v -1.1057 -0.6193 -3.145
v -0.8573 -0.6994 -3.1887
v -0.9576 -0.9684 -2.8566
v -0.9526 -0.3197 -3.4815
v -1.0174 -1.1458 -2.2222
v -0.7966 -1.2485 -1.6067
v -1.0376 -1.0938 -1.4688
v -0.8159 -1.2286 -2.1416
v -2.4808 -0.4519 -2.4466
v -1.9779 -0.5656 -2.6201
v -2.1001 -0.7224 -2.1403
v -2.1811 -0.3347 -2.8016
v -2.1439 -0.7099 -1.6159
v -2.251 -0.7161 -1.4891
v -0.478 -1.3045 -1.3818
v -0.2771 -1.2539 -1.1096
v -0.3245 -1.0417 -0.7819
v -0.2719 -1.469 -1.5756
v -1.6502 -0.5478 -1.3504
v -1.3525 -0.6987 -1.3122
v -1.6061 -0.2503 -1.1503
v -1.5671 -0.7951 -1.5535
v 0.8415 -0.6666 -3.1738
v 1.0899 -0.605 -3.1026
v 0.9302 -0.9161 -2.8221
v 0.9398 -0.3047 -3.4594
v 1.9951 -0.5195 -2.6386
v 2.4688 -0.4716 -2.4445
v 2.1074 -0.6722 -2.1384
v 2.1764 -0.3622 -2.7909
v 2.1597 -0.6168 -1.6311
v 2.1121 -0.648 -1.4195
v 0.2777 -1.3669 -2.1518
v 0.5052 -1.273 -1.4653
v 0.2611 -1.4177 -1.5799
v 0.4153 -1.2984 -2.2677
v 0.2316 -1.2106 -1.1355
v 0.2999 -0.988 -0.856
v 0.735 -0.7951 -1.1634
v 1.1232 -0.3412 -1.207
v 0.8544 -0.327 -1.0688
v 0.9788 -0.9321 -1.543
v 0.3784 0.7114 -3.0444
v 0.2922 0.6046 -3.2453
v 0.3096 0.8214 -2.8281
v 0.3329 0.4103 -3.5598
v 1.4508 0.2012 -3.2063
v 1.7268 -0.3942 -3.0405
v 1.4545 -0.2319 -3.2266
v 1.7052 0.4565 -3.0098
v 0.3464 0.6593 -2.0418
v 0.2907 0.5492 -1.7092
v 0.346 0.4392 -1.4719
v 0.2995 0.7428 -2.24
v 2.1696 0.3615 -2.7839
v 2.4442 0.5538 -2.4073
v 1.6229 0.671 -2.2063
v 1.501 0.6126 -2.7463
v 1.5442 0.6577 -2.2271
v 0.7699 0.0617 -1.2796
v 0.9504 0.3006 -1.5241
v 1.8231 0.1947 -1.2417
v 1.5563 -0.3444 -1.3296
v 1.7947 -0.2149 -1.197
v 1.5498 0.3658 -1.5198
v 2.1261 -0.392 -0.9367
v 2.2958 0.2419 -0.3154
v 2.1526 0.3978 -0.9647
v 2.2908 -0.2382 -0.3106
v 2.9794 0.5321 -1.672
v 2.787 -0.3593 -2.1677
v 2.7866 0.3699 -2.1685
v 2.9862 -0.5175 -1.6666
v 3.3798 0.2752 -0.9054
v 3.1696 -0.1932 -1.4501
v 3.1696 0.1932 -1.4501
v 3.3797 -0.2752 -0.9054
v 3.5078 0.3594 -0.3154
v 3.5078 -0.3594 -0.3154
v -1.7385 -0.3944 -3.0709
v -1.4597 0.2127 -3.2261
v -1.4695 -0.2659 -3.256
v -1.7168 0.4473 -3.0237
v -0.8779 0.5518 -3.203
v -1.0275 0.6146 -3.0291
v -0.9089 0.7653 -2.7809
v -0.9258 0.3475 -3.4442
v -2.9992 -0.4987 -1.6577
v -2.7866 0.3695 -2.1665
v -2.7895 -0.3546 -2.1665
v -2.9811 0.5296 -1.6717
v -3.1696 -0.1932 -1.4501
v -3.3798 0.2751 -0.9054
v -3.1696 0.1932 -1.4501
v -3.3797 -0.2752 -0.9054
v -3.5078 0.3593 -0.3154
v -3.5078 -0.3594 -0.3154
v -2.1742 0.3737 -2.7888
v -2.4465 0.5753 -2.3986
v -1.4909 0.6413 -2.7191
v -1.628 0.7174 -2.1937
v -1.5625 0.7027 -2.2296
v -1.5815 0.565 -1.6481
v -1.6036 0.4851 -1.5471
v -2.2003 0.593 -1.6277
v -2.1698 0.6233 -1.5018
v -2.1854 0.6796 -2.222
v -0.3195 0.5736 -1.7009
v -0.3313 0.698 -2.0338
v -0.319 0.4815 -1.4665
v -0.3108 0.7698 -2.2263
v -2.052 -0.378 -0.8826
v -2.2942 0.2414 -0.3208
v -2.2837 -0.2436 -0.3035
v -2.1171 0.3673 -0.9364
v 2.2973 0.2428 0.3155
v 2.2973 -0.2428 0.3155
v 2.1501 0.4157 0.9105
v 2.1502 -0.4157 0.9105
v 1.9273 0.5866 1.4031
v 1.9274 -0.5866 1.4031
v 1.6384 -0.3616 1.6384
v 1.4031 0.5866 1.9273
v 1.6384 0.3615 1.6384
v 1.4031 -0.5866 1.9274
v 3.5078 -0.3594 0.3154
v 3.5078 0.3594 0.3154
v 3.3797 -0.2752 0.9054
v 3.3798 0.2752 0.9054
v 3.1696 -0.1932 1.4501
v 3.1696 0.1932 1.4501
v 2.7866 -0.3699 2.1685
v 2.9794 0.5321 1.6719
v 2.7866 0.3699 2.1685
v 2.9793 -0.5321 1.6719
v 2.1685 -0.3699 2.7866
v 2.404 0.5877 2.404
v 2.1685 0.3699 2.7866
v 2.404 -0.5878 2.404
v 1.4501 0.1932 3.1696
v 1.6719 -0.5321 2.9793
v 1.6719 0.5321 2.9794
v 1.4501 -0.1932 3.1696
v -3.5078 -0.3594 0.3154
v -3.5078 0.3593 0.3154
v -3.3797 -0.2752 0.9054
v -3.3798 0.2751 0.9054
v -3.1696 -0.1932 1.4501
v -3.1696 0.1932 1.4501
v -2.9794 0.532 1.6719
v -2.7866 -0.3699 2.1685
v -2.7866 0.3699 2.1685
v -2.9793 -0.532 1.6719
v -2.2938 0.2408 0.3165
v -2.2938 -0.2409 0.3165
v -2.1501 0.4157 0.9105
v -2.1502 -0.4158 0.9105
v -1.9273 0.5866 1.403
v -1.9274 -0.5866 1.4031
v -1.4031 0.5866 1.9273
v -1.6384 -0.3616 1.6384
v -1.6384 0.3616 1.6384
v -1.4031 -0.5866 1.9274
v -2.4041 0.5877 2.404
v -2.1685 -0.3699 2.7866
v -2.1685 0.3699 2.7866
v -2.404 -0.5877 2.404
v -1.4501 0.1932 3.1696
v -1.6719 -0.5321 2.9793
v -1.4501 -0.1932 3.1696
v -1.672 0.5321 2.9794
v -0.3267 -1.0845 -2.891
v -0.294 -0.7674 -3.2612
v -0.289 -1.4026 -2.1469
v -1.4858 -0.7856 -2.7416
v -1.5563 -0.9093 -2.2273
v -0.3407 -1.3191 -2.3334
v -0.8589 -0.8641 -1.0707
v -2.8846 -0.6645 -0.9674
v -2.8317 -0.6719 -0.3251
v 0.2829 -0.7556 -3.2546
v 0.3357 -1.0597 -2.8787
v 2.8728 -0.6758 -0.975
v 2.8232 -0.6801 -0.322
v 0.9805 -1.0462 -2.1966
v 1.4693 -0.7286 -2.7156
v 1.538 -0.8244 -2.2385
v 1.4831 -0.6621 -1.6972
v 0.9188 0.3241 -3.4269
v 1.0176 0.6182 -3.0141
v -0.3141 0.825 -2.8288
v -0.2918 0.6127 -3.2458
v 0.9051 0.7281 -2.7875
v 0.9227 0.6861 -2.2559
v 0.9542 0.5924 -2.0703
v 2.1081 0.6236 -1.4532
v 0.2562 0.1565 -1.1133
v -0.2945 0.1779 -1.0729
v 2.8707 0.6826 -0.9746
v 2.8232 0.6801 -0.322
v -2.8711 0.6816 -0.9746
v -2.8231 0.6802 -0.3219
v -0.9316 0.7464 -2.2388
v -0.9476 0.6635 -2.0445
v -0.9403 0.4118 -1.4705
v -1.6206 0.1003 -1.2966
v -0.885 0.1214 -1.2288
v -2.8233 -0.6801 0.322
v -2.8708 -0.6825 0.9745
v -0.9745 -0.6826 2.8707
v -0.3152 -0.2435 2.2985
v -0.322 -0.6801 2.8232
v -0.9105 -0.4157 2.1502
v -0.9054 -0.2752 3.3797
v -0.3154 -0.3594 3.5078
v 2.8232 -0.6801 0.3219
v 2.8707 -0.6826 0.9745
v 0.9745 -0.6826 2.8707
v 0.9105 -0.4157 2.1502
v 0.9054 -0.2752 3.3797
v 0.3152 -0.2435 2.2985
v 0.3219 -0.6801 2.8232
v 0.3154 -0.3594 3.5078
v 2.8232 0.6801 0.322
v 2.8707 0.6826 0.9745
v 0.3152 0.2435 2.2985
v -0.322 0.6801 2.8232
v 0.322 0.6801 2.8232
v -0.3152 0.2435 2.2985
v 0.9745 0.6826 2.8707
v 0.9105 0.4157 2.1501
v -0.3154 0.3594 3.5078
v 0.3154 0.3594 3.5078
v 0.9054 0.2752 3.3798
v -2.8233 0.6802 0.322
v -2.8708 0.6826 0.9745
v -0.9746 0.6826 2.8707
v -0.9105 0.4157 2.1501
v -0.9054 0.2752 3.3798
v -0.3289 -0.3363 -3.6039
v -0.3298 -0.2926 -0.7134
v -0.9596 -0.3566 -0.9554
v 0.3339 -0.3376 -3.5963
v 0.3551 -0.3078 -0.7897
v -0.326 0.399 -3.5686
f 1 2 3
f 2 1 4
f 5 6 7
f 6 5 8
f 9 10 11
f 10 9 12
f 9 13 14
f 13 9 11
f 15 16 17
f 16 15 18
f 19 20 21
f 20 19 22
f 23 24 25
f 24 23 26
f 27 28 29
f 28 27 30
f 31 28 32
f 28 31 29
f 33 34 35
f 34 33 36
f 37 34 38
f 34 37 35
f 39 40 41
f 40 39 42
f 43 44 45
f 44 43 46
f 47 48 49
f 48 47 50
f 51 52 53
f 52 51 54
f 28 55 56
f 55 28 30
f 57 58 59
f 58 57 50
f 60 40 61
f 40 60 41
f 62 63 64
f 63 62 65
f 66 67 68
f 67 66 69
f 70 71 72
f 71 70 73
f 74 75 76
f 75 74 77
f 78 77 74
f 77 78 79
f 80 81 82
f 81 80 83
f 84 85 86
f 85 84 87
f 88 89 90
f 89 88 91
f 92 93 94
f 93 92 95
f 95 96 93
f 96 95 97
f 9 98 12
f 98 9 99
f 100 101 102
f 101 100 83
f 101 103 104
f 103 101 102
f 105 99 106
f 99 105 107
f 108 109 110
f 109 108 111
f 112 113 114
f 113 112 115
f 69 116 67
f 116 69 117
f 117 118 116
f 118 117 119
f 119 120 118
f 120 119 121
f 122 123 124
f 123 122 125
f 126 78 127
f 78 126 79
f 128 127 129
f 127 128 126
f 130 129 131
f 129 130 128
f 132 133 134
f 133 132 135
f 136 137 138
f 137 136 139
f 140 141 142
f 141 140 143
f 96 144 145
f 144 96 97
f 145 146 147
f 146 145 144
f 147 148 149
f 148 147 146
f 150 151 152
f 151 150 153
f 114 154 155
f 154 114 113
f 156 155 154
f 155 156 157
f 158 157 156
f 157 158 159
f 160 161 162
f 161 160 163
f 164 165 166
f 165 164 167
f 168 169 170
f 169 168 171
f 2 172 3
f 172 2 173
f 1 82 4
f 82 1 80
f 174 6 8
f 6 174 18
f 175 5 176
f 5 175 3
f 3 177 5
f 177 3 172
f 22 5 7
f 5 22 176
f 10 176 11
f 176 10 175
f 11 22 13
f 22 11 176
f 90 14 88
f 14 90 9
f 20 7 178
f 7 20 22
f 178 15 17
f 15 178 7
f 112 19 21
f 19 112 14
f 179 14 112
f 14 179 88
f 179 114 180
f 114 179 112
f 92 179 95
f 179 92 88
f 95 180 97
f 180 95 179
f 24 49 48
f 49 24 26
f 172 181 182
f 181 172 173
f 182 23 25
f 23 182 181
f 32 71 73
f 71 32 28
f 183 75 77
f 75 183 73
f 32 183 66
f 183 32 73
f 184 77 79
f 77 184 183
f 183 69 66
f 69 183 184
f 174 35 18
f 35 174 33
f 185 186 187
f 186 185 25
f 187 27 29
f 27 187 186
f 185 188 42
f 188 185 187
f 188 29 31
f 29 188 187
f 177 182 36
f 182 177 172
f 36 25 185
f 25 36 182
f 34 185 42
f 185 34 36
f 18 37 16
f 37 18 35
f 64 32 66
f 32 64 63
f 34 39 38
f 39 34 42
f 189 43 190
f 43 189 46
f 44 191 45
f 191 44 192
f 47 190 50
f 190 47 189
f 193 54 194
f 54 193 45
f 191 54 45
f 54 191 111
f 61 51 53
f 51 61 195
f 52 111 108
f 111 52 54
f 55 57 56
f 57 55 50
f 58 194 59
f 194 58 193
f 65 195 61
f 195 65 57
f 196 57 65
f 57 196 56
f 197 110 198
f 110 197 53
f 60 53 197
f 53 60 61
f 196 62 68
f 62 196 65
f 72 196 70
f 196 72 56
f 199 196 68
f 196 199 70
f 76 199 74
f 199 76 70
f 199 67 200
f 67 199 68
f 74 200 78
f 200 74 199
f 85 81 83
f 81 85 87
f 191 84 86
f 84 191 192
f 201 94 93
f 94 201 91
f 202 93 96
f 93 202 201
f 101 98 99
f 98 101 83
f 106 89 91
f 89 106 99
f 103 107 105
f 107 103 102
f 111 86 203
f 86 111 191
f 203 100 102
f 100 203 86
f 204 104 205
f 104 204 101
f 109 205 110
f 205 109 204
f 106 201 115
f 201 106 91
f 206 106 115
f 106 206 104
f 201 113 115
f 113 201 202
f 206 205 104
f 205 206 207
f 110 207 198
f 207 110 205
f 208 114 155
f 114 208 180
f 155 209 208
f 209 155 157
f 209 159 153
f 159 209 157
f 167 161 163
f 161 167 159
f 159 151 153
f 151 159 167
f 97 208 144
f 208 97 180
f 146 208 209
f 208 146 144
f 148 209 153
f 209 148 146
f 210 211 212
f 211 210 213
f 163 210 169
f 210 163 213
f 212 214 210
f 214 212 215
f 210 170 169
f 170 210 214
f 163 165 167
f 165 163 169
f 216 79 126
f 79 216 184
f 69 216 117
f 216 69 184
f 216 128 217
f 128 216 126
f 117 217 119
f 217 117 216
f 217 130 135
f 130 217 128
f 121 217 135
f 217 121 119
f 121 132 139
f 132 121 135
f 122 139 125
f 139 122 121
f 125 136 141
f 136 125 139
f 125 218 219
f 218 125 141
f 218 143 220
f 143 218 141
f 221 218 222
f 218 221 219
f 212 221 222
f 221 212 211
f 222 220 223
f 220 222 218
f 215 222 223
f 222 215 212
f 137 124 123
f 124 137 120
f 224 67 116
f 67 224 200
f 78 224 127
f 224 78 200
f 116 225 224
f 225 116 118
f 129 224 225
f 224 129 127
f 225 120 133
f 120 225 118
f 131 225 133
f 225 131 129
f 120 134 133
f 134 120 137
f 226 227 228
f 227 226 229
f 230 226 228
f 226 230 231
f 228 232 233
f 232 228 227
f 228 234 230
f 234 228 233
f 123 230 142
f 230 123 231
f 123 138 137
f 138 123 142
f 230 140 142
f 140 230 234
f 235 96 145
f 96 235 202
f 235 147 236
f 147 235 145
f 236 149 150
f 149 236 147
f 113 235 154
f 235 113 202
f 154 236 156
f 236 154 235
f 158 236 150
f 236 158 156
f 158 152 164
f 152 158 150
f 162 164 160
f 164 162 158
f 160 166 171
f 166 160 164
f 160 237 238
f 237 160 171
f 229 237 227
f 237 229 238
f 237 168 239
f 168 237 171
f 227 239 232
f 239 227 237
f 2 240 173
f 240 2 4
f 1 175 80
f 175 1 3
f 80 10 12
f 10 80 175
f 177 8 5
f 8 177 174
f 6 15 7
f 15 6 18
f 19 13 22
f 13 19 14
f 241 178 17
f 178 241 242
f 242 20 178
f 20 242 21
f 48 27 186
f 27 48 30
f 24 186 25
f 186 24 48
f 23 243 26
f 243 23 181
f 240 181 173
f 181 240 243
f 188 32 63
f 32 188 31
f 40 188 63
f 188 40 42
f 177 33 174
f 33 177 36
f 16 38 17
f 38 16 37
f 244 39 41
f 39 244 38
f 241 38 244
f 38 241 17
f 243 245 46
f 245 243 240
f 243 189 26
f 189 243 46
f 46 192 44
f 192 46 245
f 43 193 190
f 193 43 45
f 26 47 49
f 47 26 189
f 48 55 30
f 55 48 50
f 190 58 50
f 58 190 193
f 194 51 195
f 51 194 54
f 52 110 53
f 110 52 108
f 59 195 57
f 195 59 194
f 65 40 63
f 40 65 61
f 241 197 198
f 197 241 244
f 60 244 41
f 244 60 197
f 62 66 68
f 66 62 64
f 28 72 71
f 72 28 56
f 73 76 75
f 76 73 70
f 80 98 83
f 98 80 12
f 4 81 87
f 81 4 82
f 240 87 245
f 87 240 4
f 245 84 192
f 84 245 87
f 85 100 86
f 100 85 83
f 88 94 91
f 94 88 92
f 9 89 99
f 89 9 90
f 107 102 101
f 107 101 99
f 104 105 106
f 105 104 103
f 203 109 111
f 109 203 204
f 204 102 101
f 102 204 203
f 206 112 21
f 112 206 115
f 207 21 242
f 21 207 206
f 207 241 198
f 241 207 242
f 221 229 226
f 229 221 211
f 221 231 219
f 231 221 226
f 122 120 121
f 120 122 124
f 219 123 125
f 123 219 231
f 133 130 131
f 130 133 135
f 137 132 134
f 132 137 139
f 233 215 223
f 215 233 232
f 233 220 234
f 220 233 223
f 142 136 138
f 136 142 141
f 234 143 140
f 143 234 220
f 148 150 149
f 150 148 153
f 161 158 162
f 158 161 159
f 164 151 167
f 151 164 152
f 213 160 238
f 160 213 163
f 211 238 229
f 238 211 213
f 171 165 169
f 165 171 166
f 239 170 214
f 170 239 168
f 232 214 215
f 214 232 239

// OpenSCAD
model=[];
DualC(model);
//////////////////////////////////////////////////////////////////////////////////////
module DualC(model){
v=octree([-10,-10,-10], 20 ,model,5);
points=[for(i=[0:len(v)-1])if(v[i][1] !=undef) v[i][1]];
faces=faceworker(v);
echo(len(v),len(points),len(faces));
polyhedron(points,faces);
echo(points,faces);}
 
//////////////////////////////////////////////////////////////////////////////////////
//////////////////////////////////////////////////////////////////////////////////////

function octree(p1,S,model,d=6)=let(s=S/2,e1=eval(p1))d>0?
 abs(e1) >S*1.71?[]:concat(
 octree([p1.x,p1.y,p1.z],s,model,d-1), octree([p1.x+s,p1.y,p1.z],s,model,d-1),
 octree([p1.x+s,p1.y+s,p1.z],s,model,d-1), octree([p1.x,p1.y+s,p1.z],s,model,d-1),
 octree([p1.x,p1.y,p1.z+s],s,model,d-1), octree([p1.x+s,p1.y,p1.z+s],s,model,d-1),
 octree([p1.x+s,p1.y+s,p1.z+s],s,model,d-1), octree([p1.x,p1.y+s,p1.z+s],s,model,d-1))
:
let(
p2=  (p1+[S,0,0]),p3=  (p1+[0,S,0]),p4=  (p1+[0,0,S]),p5=  (p1+[S,S,0]),
p6=  (p1+[S,0,S]),p7=  (p1+[0,S,S]),p8=  (p1+[S,S,S]),e2= eval(p2),
e3= eval(p3),e4= eval(p4),e5= eval(p5),e6= eval(p6),e7= eval(p7),e8= eval(p8),
face1=[encode(p1),encode(p1+[0,-S,0]),encode(p1+[0,-S,-S]),encode(p1+[0,0,-S])],
face2=[encode(p1),encode(p1+[-S,0,0]),encode(p1+[-S,0,-S]),encode(p1+[0,0,-S])],
face3=[encode(p1),encode(p1+[0,-S,0]),encode(p1+[-S,-S,0]),encode(p1+[-S,0,0])],
pl2=makepl(e1,e2,e3,e4,e5,e6,e7,e8,p1, p2, p3, p4, p5, p6, p7, p8),
pl=[for(i=[0:len(pl2)-1])if(pl2[i][1]!=[0,0,0])pl2[i]],
po=findp2p(p1+[s,s,s],pl,p1,p1+[S,S,S]) // feature detector
//po=push(p1+[s,s,s])
)
abs(e1)<S*1.75?[ [encode(p1),po,[
sign(e1)==sign(e2)?[ ]:sign(e1)>0?face1:rev(face1),
sign(e1)==sign(e3)?[ ]:sign(e1)>0?rev(face2):(face2),
sign(e1)==sign(e4)?[ ]:sign(e1)>0?rev(face3):(face3),
]]]: [];
//////////////////////////////////////////////////////////////////////////////////////
//////////////////////////////////////////////////////////////////////////////////////

// feature detector
function  findp2p(p,pl,mi,ma,f= 6)=
f>0&&len(pl)>0?let(q = avrg([for(i=[0:len(pl)-1]) point2plane( p, pl[i][0] , pl[i][1] ) ]) ,df=q-p)findp2p( (p+(df*1  ) ),pl,mi,ma,f-1): p ;
function point2plane(p,o,n)=let(v=o-p)p+(n*(v.x*n.x + v.y*n.y + v.z*n.z)) ; //proj ap to a plane
 
// push point along gradient to zero boundary 
function push(p,c=5)=let(q=evalnorm(p)) p+un([q.x,q.y,q.z])*  (-q[3] )  ; 
function inter(t,r )=(sign(t)==sign(r))?undef:abs(0-t)/max(abs(t-r),0.000001); //find zero point

// build list of planes at intersected edges
function makepl(e1,e2,e3,e4,e5,e6,e7,e8,p1, p2, p3, p4, p5, p6, p7, p8)=let(
s12=inter(e1,e2),s13=inter(e1,e3),s14=inter(e1,e4),s52=inter(e5,e2),
s53=inter(e5,e3),s58=inter(e5,e8),s64=inter(e6,e4),s62=inter(e6,e2),
s68=inter(e6,e8),s74=inter(e7,e4),s73=inter(e7,e3),s78=inter(e7,e8),

p12=(s12==undef)?[lerp(p1,p2,0.5),[0,0,0]]:let(mp1=lerp(p1,p2,s12))[mp1,un(v3(evalnorm(mp1)))],
p13=(s13==undef)?[lerp(p1,p3,0.5),[0,0,0]]:let(mp2=lerp(p1,p3,s13))[mp2,un(v3(evalnorm(mp2)))],
p14=(s14==undef)?[lerp(p1,p4,0.5),[0,0,0]]:let(mp3=lerp(p1,p4,s14))[mp3,un(v3(evalnorm(mp3)))],
p52=(s52==undef)?[lerp(p5,p2,0.5),[0,0,0]]:let(mp4=lerp(p5,p2,s52))[mp4,un(v3(evalnorm(mp4)))],
p53=(s53==undef)?[lerp(p5,p3,0.5),[0,0,0]]:let(mp5=lerp(p5,p3,s53))[mp5,un(v3(evalnorm(mp5)))],
p58=(s58==undef)?[lerp(p5,p8,0.5),[0,0,0]]:let(mp6=lerp(p5,p8,s58))[mp6,un(v3(evalnorm(mp6)))],
p64=(s64==undef)?[lerp(p6,p4,0.5),[0,0,0]]:let(mp7=lerp(p6,p4,s64))[mp7,un(v3(evalnorm(mp7)))],
p62=(s62==undef)?[lerp(p6,p2,0.5),[0,0,0]]:let(mp8=lerp(p6,p2,s62))[mp8,un(v3(evalnorm(mp8)))],
p68=(s68==undef)?[lerp(p6,p8,0.5),[0,0,0]]:let(mp9=lerp(p6,p8,s68))[mp9,un(v3(evalnorm(mp9)))],
p74=(s74==undef)?[lerp(p7,p4,0.5),[0,0,0]]:let(mp10=lerp(p7,p4,s74))[mp10,un(v3(evalnorm(mp10)))],
p73=(s73==undef)?[lerp(p7,p3,0.5),[0,0,0]]:let(mp11=lerp(p7,p3,s73))[mp11,un(v3(evalnorm(mp11)))],
p78=(s78==undef)?[lerp(p7,p8,0.5),[0,0,0]]:let(mp12=lerp(p7,p8,s78))[mp12,un(v3(evalnorm(mp12)))] 
)[p12,p13,p14,p52,p53,p58,p64,p62,p68,p74,p73,p78];
//////////////////////////////////////////////////////////////////////////////////////
//////////////////////////////////////////////////////////////////////////////////////
 
function encode(p)=str("X", (p.x),"Y", (p.y),"Z", (p.z));// build search key from xyz
//find and  connect surrounding points to faces
function faceworker(v)=concat([for(i=[0:len(v)-1]) if(v[i][2][0]!=[ ]) [
find(v[i][2][0][0],v),find(v[i][2][0][1],v),find(v[i][2][0][2],v),find(v[i][2][0][3],v) ] ],
[for(i=[0:len(v)-1]) if(v[i][2][1]!=[ ]) [
find(v[i][2][1][0],v),find(v[i][2][1][1],v),find(v[i][2][1][2],v),find(v[i][2][1][3],v) ] ],
[for(i=[0:len(v)-1]) if(v[i][2][2]!=[ ]) [
find(v[i][2][2][0],v),find(v[i][2][2][1],v),find(v[i][2][2][2],v),find(v[i][2][2][3],v) ] ] ); 

//reverse list(face)
function rev(v)=[for(i=[len(v)-1:-1:0])v[i]]; 
 
//like  search() but works with string key used to build polyhedron 
function find(key,list,c=0)=c>len(list)-1?undef:key==list[c][0]?c:find(key,list,c+1);

//   return vec4 of normal and distance at point q
function evalnorm(q,model)=let(tiny=0.0001,e=eval(q,model))[e-eval([q.x-tiny,q.y,q.z],model),e-eval([q.x,q.y-tiny,q.z],model),e-eval([q.x,q.y,q.z-tiny],model),e];
//Main evaluator
function eval(p,model )=   minR( torus(p), box(p),2);
//////////////////////////////////////////////////////////////////////////////////////
//////////////////////////////////////////////////////////////////////////////////////
// testing primitives
function torus(p,tx=2.9,ty= 0.61)= let(q = [len3([p.x,p.z])-tx,p.y]) len3(q)-ty;
function box(p1,b=0.71) = let(p=p1+[0.1,0.6,1.5])len3(p)-b;
function minl(l,r,c=0)=c<len(l)-1?minR(l[c],minl(l,r,c+1),r):l[c];
 function maxl(l,r,c=0)=c<len(l)-1?maxR(l[c],maxl(l,r,c+1),r):l[c];

function  minR(  d1,   d2,   r=5) =r>0? let( m = min(d1, d2))(abs(d1) < abs(r) &&  abs(d2)< abs(r)) ||(d1 < r &&  d2 < r) ?min (m, r-len3([ r - d1,r -  d2]) ) :m:let( m = min(d1, d2),rr=-r)(d1 < rr &&  d2 < rr) ?min (m, len3([ d1, d2]) -rr):m;   
 
function  maxR(  d1,   d2,   r) = let( m = max(d1, d2))  (d1 > -r &&  d2> -r)   ? max(m,-r+len3([ -r-d1, -r-d2])) :m ;
//////////////////////////////////////////////////////////////////////////////////////
//////////////////////////////////////////////////////////////////////////////////////
//////////////////////////////////////////////////////////////////////////////////////
//////////////////////////////////////////////////////////////////////////////////////
//////////////////////////////////////////////////////////////////////////////////////

function addl(l,c=0)=c<len(l)-1?l[c]+addl(l,c+1):l[c];
function avrg(l)=len(l)>1?addl(l)/(len(l)):l;
function lerp(start, end, bias) = (end * bias + start * (1 - bias));
function un(v) = v / max(len3(v), 0.000001) * 1;// div by zero safe unit normal
function len3(v) =len(v)>1?sqrt(addl([for(i=[0:len(v)-1])pow(v[i], 2)])):len(v)==1?v[0]:v; 
function rnd(a = 1, b = 0) = (rands(min(a, b), max(a, b), 1)[0]);
function rndc(a = 1, b = 0)=[rnd(a,b),rnd(a,b),rnd(a,b)];
function v3(p)=[p.x,p.y,p.z]; // vec3 formatter
